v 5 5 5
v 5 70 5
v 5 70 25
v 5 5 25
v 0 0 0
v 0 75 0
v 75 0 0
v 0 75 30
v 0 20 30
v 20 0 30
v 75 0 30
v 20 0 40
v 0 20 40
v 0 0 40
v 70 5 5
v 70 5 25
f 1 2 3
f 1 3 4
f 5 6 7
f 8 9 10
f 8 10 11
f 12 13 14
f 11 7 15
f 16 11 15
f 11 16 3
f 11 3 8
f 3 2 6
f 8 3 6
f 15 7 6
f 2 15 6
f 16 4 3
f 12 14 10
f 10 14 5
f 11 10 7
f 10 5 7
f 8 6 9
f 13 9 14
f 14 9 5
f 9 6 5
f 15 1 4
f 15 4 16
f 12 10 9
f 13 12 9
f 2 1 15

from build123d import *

# Parameters (mm, degrees)
F1_DEPTH = 30
F2_T     = -5
F4_DEPTH = 10


with BuildPart() as f1:
    # F0 (on Top) → F1 (new body)
    with BuildSketch(Plane.XY):
        Polygon((0, 75), (0, 0), (75, 0), align=None)
    extrude(amount=F1_DEPTH)

    # F2
    f2_openings = [f1.faces().sort_by_distance(p)[0] for p in [
        (37.5, 37.5, 15),
    ]]
    offset(amount=F2_T, openings=f2_openings)

    # F3 (on face) → F4 (join)
    with BuildSketch(Plane.XY.offset(30)):
        Polygon((0, 20), (0, 0), (20, 0), align=None)
    extrude(amount=F4_DEPTH)


solid = f1.part
